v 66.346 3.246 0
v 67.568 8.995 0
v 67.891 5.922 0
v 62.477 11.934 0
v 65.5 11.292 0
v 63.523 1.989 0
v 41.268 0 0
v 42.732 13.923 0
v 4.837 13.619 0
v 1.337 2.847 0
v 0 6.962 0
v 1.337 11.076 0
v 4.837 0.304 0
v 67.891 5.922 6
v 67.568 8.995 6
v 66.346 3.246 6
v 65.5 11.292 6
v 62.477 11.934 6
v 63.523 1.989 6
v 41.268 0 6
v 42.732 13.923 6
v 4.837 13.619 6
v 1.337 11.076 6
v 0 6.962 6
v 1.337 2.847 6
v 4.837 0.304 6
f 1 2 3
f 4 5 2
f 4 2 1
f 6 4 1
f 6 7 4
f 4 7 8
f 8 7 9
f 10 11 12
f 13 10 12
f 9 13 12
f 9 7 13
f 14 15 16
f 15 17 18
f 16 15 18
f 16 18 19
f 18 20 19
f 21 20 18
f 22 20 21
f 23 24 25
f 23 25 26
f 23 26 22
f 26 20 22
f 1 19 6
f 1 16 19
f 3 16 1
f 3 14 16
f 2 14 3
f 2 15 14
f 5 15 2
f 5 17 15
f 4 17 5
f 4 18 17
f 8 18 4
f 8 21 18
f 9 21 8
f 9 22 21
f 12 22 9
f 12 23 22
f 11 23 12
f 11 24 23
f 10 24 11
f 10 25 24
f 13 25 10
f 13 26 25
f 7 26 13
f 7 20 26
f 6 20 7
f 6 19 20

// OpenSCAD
$fn = 32;

// ----------------------------------------------------------------------
// Lever arm: two bosses 14 and 14 mm, 35 mm between centres
// ----------------------------------------------------------------------

// --- parameters (mm) ---
profile_height = 6;       // extrusion height
profile_points = 13;      // points of the closed outline

profile = [[0, 6.962], [1.337, 2.847], [4.837, 0.304], [41.268, 0], [63.523, 1.989], [66.346, 3.246], [67.891, 5.922], [67.568, 8.995], [65.5, 11.292], [62.477, 11.934], [42.732, 13.923], [4.837, 13.619], [1.337, 11.076]];  // single closed polygon, 13 points, counter clockwise

// --- the one profile operation ---
linear_extrude(height = profile_height) polygon(points = profile);
